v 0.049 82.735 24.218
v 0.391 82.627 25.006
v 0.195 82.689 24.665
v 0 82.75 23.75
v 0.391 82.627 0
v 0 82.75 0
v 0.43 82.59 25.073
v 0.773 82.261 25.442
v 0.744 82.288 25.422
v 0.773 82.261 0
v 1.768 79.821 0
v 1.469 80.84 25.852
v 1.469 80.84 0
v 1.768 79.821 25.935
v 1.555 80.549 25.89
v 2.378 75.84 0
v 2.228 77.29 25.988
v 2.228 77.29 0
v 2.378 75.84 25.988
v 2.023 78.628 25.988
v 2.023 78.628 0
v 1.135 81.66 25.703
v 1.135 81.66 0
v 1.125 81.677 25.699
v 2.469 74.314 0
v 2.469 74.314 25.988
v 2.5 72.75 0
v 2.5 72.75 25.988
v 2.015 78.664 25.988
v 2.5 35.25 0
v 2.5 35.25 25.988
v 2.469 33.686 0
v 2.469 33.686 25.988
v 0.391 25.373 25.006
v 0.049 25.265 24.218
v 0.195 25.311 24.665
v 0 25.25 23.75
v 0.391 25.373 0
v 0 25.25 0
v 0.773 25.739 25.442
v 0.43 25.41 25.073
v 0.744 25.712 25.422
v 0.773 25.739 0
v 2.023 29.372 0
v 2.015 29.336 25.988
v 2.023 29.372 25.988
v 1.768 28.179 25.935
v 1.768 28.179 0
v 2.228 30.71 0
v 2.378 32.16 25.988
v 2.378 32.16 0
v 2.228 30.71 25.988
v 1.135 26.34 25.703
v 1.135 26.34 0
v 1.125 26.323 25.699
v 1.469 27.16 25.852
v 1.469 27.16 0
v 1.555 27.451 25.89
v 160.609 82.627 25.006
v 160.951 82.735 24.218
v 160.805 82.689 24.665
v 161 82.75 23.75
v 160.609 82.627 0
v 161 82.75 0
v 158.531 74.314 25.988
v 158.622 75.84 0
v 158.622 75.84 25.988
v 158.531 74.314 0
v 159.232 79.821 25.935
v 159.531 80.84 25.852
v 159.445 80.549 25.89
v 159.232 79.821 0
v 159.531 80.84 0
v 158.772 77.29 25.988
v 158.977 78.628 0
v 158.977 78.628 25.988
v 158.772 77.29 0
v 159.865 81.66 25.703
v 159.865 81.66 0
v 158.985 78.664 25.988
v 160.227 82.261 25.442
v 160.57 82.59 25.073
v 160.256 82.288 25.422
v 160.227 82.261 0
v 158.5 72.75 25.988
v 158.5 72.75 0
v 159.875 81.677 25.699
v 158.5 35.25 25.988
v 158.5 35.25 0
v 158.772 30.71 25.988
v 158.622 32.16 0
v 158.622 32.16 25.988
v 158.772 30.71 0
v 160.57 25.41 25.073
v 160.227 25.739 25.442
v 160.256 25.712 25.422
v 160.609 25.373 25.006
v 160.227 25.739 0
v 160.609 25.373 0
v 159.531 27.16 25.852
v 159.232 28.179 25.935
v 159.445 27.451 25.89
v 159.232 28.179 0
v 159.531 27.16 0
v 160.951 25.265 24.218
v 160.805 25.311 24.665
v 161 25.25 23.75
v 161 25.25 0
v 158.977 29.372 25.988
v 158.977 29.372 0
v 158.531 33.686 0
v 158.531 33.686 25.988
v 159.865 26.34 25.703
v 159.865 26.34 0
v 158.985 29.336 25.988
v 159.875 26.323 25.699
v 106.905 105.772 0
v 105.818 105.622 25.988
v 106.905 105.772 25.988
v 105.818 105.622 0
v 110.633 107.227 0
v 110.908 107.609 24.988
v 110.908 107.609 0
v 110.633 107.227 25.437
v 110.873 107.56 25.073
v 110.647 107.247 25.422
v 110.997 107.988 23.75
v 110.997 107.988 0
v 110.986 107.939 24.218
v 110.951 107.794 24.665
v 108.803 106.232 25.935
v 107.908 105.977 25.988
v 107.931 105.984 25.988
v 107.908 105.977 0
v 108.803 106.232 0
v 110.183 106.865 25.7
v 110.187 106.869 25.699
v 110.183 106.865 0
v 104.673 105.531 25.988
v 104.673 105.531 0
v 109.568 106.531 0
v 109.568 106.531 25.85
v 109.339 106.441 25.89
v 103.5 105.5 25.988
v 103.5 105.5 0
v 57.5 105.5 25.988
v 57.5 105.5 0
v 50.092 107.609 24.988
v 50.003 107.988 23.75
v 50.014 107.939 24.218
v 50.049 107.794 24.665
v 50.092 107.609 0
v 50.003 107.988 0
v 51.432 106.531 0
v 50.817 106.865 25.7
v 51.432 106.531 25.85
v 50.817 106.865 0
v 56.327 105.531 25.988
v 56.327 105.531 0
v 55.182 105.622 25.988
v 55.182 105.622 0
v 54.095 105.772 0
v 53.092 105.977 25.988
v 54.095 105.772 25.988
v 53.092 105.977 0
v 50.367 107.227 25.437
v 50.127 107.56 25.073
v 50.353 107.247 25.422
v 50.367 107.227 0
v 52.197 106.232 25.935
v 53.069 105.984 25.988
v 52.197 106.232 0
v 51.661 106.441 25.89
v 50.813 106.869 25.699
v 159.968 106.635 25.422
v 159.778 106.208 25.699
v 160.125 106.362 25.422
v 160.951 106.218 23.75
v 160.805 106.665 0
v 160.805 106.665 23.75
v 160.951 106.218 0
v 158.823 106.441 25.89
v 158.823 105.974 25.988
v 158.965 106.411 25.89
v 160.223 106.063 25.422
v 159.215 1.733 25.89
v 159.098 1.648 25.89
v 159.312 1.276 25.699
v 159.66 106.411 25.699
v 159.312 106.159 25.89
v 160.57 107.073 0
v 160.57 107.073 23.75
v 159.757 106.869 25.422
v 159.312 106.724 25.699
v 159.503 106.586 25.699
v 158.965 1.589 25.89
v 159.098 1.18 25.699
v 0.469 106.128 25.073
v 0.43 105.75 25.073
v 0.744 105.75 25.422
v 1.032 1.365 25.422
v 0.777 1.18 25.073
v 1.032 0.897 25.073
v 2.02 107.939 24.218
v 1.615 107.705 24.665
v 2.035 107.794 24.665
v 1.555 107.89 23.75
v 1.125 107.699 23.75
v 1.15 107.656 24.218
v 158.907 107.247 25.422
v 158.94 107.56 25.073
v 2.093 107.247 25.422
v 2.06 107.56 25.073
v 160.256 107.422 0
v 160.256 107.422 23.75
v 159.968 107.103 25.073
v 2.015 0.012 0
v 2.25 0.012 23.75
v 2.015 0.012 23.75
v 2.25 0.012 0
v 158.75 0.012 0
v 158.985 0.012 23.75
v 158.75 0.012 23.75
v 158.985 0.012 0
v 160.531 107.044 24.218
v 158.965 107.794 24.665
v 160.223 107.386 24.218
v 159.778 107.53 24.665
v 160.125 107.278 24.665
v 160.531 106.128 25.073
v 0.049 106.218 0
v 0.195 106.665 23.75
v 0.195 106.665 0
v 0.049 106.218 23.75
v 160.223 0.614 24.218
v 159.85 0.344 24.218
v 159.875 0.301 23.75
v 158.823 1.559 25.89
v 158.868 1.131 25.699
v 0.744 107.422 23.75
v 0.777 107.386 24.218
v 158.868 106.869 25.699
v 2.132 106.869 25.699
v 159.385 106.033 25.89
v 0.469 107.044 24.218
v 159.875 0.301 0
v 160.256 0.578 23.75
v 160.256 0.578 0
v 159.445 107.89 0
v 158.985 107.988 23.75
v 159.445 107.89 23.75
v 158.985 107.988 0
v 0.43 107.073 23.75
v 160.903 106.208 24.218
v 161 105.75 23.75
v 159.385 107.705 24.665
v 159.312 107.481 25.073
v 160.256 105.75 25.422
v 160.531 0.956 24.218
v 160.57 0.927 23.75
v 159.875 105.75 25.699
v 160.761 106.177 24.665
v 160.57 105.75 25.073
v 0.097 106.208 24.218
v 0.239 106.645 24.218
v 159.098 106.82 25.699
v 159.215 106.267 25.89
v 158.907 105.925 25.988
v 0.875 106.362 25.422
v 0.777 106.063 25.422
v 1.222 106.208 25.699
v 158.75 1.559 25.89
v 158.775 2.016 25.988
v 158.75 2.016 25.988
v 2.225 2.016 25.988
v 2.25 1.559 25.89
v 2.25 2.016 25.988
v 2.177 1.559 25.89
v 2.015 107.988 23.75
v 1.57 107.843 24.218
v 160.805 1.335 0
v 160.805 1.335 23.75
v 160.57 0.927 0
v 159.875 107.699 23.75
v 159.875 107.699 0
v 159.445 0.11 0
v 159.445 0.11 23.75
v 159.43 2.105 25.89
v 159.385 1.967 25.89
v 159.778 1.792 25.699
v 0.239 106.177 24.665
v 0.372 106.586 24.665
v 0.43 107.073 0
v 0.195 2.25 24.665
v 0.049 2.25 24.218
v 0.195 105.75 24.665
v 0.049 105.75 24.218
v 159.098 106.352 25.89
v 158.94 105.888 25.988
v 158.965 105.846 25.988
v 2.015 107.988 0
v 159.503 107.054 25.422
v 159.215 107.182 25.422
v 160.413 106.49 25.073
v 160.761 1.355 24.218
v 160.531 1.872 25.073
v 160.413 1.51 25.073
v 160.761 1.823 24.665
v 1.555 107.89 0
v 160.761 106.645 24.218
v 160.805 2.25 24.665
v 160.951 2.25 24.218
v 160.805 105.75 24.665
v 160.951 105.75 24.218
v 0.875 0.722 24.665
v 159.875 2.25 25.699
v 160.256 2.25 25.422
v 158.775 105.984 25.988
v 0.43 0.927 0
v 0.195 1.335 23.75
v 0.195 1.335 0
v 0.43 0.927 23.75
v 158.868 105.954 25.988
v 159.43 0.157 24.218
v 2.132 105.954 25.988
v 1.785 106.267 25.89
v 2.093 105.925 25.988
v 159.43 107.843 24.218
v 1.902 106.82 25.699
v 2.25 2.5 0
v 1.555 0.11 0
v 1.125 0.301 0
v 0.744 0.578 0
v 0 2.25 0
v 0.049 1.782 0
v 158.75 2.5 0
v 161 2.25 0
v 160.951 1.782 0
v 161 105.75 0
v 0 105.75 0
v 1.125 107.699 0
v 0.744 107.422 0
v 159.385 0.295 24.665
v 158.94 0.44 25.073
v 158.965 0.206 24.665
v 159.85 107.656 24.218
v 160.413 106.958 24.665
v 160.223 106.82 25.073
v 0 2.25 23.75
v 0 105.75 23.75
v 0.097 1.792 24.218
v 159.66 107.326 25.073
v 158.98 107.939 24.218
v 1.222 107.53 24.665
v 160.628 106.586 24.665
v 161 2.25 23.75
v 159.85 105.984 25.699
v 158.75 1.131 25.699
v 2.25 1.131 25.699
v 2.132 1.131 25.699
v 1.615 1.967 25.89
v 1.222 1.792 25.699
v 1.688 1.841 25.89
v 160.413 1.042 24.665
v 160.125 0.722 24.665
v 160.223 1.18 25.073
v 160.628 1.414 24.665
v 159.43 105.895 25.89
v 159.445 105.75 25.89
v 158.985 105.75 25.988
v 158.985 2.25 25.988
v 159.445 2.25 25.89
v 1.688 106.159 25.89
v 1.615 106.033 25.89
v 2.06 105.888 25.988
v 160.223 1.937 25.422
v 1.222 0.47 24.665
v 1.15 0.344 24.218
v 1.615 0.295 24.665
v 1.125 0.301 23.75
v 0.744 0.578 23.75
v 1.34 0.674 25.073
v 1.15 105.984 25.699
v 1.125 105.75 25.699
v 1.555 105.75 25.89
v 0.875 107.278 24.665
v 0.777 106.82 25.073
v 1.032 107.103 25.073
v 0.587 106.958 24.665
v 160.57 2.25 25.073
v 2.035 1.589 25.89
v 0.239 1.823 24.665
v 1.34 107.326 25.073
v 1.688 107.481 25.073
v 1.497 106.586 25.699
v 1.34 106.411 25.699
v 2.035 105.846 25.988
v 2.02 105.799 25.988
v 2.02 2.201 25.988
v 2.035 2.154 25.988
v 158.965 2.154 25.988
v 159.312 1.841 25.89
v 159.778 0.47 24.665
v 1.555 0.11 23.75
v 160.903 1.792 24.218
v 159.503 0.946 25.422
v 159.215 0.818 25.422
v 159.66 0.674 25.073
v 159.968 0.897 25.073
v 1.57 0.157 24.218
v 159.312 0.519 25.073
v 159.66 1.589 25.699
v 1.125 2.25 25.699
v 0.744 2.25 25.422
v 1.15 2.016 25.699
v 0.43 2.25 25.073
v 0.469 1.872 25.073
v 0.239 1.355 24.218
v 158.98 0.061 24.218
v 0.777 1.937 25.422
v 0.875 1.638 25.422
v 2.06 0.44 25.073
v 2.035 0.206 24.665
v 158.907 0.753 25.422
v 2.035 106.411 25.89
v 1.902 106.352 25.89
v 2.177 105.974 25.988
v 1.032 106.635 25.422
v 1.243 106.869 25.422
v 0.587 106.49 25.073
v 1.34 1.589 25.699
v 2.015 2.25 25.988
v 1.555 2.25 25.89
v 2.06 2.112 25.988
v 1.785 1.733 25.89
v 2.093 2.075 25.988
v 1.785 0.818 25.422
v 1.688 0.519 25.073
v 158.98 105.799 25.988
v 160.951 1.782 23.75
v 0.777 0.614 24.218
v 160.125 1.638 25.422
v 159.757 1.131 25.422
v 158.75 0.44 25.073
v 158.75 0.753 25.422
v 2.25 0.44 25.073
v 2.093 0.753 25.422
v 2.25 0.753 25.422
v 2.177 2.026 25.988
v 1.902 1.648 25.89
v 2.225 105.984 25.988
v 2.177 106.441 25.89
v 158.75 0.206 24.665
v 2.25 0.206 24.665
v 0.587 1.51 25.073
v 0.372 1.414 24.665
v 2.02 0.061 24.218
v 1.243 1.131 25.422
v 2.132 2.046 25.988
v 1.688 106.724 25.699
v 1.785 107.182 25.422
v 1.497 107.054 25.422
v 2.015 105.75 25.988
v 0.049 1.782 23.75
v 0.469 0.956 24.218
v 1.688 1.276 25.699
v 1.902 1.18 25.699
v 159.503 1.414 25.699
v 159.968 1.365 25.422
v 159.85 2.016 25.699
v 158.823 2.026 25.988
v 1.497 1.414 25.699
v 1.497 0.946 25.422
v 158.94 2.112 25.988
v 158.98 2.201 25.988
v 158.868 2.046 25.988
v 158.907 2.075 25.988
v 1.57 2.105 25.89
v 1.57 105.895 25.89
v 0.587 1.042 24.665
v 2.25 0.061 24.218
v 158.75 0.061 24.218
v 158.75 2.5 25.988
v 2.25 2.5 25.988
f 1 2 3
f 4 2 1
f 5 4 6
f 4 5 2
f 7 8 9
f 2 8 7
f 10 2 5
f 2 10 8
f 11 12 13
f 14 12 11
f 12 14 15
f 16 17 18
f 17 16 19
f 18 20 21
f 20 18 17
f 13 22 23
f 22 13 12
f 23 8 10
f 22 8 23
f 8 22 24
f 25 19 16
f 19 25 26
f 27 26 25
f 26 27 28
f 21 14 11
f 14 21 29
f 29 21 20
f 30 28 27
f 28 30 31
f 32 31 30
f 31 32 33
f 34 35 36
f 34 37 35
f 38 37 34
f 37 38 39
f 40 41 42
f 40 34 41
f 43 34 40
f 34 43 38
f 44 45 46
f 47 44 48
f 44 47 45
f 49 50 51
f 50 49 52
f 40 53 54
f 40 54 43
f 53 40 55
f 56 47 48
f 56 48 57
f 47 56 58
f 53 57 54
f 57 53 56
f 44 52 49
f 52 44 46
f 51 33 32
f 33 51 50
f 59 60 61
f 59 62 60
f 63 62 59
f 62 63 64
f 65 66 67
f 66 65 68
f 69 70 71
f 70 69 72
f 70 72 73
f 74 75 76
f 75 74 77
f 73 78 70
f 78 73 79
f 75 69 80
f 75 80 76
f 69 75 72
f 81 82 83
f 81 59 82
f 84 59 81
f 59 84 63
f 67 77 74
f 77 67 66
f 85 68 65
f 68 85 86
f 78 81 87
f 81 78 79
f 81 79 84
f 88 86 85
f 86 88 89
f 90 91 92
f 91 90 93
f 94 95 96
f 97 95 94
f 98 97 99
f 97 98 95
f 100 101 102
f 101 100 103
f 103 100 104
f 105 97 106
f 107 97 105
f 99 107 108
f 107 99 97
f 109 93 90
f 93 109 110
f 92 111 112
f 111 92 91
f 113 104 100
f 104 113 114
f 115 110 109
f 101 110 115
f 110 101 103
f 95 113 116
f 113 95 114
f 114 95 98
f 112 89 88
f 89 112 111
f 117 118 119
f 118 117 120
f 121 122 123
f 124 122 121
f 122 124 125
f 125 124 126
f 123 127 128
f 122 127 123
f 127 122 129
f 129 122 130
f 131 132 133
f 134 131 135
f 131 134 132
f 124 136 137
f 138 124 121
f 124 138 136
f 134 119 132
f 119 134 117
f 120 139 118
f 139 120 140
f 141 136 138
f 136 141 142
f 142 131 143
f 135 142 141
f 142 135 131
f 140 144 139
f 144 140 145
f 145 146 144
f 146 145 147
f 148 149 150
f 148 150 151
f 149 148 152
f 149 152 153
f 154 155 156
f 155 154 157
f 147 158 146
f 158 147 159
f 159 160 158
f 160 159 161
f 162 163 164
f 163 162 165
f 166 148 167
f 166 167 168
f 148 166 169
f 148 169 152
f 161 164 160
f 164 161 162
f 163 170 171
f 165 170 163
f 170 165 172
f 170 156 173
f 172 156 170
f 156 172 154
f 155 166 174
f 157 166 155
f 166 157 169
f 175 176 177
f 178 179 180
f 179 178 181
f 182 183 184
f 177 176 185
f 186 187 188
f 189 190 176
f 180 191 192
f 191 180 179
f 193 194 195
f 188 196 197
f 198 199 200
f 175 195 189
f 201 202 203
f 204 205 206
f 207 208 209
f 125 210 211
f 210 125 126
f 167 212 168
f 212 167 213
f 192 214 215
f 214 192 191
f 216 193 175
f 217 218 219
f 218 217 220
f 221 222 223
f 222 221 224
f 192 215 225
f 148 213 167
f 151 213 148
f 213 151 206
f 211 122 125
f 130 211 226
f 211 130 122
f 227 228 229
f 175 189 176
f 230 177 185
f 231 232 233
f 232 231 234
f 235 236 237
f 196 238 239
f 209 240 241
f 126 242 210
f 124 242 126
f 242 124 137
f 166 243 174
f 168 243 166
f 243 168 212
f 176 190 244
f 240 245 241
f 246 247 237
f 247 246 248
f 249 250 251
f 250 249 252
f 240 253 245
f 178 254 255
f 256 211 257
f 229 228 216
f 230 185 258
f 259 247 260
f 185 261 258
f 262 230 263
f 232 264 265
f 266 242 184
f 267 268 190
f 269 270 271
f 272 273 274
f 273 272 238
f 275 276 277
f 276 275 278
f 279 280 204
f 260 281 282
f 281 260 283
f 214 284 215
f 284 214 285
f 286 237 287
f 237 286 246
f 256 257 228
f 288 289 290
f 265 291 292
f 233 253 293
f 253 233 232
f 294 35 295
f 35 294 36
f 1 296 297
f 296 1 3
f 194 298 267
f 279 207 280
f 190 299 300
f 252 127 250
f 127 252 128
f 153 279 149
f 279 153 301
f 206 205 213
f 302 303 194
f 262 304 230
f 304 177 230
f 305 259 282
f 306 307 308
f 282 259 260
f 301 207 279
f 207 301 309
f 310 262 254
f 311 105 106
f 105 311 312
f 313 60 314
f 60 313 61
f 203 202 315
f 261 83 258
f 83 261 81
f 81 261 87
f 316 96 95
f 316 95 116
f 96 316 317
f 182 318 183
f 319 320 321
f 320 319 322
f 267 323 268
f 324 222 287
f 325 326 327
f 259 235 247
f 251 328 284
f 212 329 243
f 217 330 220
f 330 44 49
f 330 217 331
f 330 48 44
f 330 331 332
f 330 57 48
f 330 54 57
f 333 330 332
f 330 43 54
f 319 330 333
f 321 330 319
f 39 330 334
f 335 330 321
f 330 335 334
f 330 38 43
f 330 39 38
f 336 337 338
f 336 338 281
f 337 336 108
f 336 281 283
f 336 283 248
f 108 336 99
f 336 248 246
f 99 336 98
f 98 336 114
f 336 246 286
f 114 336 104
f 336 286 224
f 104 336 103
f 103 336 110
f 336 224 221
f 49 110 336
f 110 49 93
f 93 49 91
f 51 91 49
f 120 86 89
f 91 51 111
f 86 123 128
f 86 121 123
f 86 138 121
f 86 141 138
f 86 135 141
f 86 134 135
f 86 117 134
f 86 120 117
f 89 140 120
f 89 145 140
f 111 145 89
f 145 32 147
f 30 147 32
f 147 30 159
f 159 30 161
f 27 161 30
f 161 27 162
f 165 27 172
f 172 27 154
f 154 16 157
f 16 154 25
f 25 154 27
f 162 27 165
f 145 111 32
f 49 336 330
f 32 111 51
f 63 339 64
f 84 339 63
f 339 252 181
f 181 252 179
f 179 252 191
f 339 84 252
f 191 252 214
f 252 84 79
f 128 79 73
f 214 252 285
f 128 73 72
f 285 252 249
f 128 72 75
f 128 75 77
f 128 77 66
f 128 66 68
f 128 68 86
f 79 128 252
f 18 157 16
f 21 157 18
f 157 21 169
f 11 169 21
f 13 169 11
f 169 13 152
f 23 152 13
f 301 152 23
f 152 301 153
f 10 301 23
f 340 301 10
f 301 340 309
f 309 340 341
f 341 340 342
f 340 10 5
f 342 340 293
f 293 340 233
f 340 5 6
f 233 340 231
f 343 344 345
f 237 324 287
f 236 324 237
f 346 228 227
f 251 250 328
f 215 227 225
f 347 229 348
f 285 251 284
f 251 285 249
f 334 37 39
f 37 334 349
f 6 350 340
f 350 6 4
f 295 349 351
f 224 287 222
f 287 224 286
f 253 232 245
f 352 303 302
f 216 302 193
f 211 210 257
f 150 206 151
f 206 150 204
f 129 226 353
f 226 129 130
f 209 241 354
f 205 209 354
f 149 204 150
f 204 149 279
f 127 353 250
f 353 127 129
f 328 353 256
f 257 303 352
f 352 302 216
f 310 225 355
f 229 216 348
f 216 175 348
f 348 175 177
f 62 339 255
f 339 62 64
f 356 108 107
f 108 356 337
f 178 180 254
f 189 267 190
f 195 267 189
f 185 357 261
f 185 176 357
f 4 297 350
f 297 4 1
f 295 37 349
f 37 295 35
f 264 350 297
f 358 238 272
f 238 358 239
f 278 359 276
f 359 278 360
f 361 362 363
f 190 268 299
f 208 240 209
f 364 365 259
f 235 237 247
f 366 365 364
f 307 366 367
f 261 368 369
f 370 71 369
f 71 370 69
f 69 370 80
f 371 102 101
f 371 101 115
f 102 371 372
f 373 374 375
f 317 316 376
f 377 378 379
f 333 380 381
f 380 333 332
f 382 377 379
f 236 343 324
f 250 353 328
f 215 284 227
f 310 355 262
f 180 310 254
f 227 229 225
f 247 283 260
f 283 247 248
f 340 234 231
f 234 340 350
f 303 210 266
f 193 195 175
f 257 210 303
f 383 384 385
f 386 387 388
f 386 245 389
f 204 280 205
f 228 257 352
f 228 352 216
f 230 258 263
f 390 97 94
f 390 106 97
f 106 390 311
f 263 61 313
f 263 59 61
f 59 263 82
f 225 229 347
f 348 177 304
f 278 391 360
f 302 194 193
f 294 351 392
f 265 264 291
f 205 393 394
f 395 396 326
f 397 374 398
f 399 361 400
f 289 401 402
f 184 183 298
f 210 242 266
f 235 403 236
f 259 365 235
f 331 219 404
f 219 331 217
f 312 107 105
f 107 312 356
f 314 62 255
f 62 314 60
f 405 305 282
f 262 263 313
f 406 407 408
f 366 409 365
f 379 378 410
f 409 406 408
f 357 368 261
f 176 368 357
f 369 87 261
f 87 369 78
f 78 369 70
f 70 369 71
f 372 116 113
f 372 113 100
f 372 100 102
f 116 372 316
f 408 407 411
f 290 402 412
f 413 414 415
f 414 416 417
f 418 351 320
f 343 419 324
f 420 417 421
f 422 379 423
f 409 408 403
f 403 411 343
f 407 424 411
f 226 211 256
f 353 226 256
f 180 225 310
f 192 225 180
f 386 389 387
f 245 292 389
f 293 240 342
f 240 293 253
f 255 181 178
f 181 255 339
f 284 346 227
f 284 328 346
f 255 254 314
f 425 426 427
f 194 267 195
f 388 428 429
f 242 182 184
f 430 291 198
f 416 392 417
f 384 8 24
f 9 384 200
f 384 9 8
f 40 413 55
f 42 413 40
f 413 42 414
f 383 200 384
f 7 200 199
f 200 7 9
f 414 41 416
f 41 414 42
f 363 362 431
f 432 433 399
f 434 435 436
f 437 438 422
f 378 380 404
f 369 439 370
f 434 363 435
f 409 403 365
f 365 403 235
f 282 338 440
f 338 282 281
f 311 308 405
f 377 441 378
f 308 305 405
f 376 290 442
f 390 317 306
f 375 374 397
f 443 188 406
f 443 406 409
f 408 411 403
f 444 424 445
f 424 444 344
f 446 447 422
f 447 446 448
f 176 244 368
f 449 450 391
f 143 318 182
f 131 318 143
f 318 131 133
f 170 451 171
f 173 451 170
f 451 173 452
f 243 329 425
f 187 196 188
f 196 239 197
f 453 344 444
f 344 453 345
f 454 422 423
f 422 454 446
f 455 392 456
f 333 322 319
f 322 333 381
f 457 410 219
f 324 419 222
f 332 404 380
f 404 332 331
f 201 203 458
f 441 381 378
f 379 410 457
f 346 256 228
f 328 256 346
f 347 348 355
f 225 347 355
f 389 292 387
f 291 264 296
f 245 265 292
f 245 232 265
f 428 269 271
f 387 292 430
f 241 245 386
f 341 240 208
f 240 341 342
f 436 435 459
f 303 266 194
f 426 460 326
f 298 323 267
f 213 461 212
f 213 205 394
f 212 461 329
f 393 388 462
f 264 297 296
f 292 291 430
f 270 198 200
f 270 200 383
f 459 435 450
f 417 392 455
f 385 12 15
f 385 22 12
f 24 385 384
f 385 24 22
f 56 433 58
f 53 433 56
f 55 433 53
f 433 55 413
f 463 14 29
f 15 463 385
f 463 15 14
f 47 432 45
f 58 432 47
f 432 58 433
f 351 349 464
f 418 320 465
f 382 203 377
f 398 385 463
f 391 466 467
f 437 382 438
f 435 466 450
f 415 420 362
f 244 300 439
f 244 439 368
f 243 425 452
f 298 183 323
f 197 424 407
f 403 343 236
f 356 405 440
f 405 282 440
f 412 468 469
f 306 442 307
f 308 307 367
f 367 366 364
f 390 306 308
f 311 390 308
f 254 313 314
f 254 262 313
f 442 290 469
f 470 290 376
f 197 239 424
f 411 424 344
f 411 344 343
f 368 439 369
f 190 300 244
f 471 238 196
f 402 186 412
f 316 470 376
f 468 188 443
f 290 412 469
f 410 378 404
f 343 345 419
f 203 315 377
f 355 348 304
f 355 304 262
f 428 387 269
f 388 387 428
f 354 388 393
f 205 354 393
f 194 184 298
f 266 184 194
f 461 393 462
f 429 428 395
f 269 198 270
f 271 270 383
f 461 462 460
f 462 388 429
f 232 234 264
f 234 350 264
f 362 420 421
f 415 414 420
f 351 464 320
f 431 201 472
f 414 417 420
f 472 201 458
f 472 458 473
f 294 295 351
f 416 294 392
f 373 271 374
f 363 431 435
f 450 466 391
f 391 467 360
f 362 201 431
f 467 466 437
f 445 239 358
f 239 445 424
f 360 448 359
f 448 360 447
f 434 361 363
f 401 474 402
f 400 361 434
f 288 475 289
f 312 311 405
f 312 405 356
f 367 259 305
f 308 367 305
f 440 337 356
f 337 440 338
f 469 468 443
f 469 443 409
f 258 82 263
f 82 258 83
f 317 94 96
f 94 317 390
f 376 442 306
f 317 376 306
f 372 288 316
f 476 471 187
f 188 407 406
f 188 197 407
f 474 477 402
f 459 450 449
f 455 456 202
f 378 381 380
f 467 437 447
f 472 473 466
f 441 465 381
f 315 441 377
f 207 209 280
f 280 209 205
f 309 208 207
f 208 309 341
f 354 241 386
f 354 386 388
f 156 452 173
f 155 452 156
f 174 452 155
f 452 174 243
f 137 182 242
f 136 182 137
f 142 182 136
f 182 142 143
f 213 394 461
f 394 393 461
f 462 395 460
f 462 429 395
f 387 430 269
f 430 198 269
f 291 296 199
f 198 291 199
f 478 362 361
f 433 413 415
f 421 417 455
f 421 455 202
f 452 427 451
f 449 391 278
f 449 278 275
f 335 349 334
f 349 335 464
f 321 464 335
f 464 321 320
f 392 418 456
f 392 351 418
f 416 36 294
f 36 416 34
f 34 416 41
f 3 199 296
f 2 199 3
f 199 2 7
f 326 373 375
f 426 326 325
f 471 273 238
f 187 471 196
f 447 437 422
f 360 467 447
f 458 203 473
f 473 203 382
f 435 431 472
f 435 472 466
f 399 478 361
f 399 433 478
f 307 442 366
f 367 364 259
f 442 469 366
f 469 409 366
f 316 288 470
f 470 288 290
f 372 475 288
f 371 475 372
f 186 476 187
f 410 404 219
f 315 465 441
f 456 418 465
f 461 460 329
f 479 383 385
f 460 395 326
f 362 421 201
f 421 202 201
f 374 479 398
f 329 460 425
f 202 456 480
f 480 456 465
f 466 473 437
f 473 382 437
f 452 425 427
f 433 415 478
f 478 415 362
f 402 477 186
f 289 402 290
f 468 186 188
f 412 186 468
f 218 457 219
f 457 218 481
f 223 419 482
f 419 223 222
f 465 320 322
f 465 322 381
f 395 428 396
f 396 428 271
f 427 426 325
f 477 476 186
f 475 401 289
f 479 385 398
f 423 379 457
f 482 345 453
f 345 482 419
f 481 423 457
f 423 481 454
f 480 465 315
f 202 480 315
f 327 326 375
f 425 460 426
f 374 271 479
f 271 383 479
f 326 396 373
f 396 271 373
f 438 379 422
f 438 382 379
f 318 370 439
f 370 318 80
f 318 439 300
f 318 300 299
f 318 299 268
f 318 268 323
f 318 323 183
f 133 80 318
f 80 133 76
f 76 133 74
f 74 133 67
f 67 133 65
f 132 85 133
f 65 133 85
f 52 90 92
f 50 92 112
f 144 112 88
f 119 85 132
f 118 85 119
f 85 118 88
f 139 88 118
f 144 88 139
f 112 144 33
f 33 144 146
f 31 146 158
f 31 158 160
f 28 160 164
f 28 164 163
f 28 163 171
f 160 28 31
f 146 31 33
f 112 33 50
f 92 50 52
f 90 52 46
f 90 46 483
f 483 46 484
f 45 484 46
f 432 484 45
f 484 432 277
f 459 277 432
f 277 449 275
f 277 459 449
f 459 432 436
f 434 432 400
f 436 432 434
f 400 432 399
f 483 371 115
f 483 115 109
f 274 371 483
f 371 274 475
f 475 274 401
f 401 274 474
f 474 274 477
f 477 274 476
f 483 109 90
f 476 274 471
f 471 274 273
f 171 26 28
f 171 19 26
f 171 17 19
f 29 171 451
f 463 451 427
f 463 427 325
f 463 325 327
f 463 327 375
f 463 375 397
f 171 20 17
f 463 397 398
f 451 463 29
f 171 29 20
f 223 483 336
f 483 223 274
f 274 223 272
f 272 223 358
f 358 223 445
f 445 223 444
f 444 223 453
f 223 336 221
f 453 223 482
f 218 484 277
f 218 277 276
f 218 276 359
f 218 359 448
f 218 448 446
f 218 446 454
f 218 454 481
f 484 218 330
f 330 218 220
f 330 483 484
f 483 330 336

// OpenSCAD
// file: roundedcube.scad
// Aquired from https://danielupshaw.com/openscad-rounded-corners/
// License unknown

// Higher definition curves
$fs = 0.01;

module roundedcube(size = [1, 1, 1], center = false, radius = 0.5, apply_to = "all") {
	// If single value, convert to [x, y, z] vector
	size = (size[0] == undef) ? [size, size, size] : size;

	translate_min = radius;
	translate_xmax = size[0] - radius;
	translate_ymax = size[1] - radius;
	translate_zmax = size[2] - radius;

	diameter = radius * 2;

	module build_point(type = "sphere", rotate = [0, 0, 0]) {
		if (type == "sphere") {
			sphere(r = radius);
		} else if (type == "cylinder") {
			rotate(a = rotate)
			cylinder(h = diameter, r = radius, center = true);
		}
	}

	obj_translate = (center == false) ?
		[0, 0, 0] : [
			-(size[0] / 2),
			-(size[1] / 2),
			-(size[2] / 2)
		];

	translate(v = obj_translate) {
		hull() {
			for (translate_x = [translate_min, translate_xmax]) {
				x_at = (translate_x == translate_min) ? "min" : "max";
				for (translate_y = [translate_min, translate_ymax]) {
					y_at = (translate_y == translate_min) ? "min" : "max";
					for (translate_z = [translate_min, translate_zmax]) {
						z_at = (translate_z == translate_min) ? "min" : "max";

						translate(v = [translate_x, translate_y, translate_z])
						if (
							(apply_to == "all") ||
							(apply_to == "xmin" && x_at == "min") || (apply_to == "xmax" && x_at == "max") ||
							(apply_to == "ymin" && y_at == "min") || (apply_to == "ymax" && y_at == "max") ||
							(apply_to == "zmin" && z_at == "min") || (apply_to == "zmax" && z_at == "max")
						) {
							build_point("sphere");
						} else {
							rotate =
								(apply_to == "xmin" || apply_to == "xmax" || apply_to == "x") ? [0, 90, 0] : (
								(apply_to == "ymin" || apply_to == "ymax" || apply_to == "y") ? [90, 90, 0] :
								[0, 0, 0]
							);
							build_point("cylinder", rotate);
						}
					}
				}
			}
		}
	}
}
// main file
use <./roundedcube.scad>

BOX_WIDTH = 161;
BOX_DEPTH = 108;
BOX_HEIGHT = 26;

BOX_RADIUS = 2.25;

LABEL_WIDTH = BOX_WIDTH - BOX_RADIUS * 2;
LABEL_DEPTH = 2.5;

SIDE_CURVE_DEPTH = 20;
SIDE_CURVE_DIAMETER = 5;
SIDE_INNER_DEPTH = 37.5;

// total = 48.5
TOP_CURVE_WIDTH = 15;
TOP_CURVE_DIAMETER = 5;
TOP_INNER_WIDTH = 46;

render_helper = 1; // Helps the quick render not have a "skin" on top of the hole

function box_width() = BOX_WIDTH;
function box_depth() = BOX_DEPTH;
function box_height() = BOX_HEIGHT;
function side_curve() = SIDE_CURVE_DIAMETER / 2;
function top_curve() = TOP_CURVE_DIAMETER / 2;
function label_depth() = LABEL_DEPTH;
function center_width_offset(width) = (BOX_WIDTH - width) / 2;
function triple_width_offset(width) = (BOX_WIDTH - width * 2) / 3;
function triple_width_offset_single(width) = (BOX_WIDTH - width) / 3;
function quad_width_offset_single(width) = (BOX_WIDTH - width) / 4;
function center_depth_offset(depth) = (BOX_DEPTH - depth) / 2;
function triple_depth_offset(depth) = (BOX_DEPTH - depth) / 3;
function triple_depth_offset_single(width) = (BOX_DEPTH - width) / 3;

module base_block() {
    roundedcube(
        [BOX_WIDTH, BOX_DEPTH, BOX_HEIGHT],
        radius = BOX_RADIUS,
        apply_to = "zmax"
    );
}

module label_cutout() {
    offset_x = (BOX_WIDTH - LABEL_WIDTH) / 2;
    translate([offset_x, -render_helper, -render_helper])
    cube([LABEL_WIDTH, LABEL_DEPTH + render_helper, BOX_HEIGHT + render_helper * 2]);
}

module side_cutout() {
    height = BOX_HEIGHT + render_helper * 2;
    half_side = SIDE_INNER_DEPTH / 2;
    
    translate([0, half_side, -render_helper])
    linear_extrude(height)
    resize([SIDE_CURVE_DIAMETER, SIDE_CURVE_DEPTH])
    circle(SIDE_CURVE_DIAMETER, $fn = 40);
    
    translate([-SIDE_CURVE_DIAMETER / 2, -half_side, -render_helper])
    cube([SIDE_CURVE_DIAMETER, SIDE_INNER_DEPTH, height]);
    
    translate([0, -half_side, -render_helper])
    linear_extrude(height)
    resize([SIDE_CURVE_DIAMETER, SIDE_CURVE_DEPTH])
    circle(SIDE_CURVE_DIAMETER, $fn = 40);
}

module side_cutouts() {
    translate([0, BOX_DEPTH / 2, 0])
    side_cutout();
    
    translate([BOX_WIDTH, BOX_DEPTH / 2, 0])
    side_cutout();
}

module top_cutout() {
    height = BOX_HEIGHT + render_helper * 2;
    half_side = TOP_INNER_WIDTH / 2;
    
    translate([BOX_WIDTH / 2, BOX_DEPTH, 0])
    union() {
        translate([half_side, 0, -render_helper])
        linear_extrude(height)
        rotate([0, 0, 90])
        resize([TOP_CURVE_DIAMETER, TOP_CURVE_WIDTH])
        circle(TOP_CURVE_DIAMETER, $fn = 40);
        
        translate([-half_side, -TOP_CURVE_DIAMETER / 2, -render_helper])
        cube([TOP_INNER_WIDTH, TOP_CURVE_DIAMETER, height]);
        
        translate([-half_side, 0, -render_helper])
        linear_extrude(height)
        rotate([0, 0, 90])
        resize([TOP_CURVE_DIAMETER, TOP_CURVE_WIDTH])
        circle(TOP_CURVE_DIAMETER, $fn = 40);
    }
}

module photo_base() {
    difference() {
        base_block();
        label_cutout();
        side_cutouts();
        top_cutout();
    }
}

photo_base();
